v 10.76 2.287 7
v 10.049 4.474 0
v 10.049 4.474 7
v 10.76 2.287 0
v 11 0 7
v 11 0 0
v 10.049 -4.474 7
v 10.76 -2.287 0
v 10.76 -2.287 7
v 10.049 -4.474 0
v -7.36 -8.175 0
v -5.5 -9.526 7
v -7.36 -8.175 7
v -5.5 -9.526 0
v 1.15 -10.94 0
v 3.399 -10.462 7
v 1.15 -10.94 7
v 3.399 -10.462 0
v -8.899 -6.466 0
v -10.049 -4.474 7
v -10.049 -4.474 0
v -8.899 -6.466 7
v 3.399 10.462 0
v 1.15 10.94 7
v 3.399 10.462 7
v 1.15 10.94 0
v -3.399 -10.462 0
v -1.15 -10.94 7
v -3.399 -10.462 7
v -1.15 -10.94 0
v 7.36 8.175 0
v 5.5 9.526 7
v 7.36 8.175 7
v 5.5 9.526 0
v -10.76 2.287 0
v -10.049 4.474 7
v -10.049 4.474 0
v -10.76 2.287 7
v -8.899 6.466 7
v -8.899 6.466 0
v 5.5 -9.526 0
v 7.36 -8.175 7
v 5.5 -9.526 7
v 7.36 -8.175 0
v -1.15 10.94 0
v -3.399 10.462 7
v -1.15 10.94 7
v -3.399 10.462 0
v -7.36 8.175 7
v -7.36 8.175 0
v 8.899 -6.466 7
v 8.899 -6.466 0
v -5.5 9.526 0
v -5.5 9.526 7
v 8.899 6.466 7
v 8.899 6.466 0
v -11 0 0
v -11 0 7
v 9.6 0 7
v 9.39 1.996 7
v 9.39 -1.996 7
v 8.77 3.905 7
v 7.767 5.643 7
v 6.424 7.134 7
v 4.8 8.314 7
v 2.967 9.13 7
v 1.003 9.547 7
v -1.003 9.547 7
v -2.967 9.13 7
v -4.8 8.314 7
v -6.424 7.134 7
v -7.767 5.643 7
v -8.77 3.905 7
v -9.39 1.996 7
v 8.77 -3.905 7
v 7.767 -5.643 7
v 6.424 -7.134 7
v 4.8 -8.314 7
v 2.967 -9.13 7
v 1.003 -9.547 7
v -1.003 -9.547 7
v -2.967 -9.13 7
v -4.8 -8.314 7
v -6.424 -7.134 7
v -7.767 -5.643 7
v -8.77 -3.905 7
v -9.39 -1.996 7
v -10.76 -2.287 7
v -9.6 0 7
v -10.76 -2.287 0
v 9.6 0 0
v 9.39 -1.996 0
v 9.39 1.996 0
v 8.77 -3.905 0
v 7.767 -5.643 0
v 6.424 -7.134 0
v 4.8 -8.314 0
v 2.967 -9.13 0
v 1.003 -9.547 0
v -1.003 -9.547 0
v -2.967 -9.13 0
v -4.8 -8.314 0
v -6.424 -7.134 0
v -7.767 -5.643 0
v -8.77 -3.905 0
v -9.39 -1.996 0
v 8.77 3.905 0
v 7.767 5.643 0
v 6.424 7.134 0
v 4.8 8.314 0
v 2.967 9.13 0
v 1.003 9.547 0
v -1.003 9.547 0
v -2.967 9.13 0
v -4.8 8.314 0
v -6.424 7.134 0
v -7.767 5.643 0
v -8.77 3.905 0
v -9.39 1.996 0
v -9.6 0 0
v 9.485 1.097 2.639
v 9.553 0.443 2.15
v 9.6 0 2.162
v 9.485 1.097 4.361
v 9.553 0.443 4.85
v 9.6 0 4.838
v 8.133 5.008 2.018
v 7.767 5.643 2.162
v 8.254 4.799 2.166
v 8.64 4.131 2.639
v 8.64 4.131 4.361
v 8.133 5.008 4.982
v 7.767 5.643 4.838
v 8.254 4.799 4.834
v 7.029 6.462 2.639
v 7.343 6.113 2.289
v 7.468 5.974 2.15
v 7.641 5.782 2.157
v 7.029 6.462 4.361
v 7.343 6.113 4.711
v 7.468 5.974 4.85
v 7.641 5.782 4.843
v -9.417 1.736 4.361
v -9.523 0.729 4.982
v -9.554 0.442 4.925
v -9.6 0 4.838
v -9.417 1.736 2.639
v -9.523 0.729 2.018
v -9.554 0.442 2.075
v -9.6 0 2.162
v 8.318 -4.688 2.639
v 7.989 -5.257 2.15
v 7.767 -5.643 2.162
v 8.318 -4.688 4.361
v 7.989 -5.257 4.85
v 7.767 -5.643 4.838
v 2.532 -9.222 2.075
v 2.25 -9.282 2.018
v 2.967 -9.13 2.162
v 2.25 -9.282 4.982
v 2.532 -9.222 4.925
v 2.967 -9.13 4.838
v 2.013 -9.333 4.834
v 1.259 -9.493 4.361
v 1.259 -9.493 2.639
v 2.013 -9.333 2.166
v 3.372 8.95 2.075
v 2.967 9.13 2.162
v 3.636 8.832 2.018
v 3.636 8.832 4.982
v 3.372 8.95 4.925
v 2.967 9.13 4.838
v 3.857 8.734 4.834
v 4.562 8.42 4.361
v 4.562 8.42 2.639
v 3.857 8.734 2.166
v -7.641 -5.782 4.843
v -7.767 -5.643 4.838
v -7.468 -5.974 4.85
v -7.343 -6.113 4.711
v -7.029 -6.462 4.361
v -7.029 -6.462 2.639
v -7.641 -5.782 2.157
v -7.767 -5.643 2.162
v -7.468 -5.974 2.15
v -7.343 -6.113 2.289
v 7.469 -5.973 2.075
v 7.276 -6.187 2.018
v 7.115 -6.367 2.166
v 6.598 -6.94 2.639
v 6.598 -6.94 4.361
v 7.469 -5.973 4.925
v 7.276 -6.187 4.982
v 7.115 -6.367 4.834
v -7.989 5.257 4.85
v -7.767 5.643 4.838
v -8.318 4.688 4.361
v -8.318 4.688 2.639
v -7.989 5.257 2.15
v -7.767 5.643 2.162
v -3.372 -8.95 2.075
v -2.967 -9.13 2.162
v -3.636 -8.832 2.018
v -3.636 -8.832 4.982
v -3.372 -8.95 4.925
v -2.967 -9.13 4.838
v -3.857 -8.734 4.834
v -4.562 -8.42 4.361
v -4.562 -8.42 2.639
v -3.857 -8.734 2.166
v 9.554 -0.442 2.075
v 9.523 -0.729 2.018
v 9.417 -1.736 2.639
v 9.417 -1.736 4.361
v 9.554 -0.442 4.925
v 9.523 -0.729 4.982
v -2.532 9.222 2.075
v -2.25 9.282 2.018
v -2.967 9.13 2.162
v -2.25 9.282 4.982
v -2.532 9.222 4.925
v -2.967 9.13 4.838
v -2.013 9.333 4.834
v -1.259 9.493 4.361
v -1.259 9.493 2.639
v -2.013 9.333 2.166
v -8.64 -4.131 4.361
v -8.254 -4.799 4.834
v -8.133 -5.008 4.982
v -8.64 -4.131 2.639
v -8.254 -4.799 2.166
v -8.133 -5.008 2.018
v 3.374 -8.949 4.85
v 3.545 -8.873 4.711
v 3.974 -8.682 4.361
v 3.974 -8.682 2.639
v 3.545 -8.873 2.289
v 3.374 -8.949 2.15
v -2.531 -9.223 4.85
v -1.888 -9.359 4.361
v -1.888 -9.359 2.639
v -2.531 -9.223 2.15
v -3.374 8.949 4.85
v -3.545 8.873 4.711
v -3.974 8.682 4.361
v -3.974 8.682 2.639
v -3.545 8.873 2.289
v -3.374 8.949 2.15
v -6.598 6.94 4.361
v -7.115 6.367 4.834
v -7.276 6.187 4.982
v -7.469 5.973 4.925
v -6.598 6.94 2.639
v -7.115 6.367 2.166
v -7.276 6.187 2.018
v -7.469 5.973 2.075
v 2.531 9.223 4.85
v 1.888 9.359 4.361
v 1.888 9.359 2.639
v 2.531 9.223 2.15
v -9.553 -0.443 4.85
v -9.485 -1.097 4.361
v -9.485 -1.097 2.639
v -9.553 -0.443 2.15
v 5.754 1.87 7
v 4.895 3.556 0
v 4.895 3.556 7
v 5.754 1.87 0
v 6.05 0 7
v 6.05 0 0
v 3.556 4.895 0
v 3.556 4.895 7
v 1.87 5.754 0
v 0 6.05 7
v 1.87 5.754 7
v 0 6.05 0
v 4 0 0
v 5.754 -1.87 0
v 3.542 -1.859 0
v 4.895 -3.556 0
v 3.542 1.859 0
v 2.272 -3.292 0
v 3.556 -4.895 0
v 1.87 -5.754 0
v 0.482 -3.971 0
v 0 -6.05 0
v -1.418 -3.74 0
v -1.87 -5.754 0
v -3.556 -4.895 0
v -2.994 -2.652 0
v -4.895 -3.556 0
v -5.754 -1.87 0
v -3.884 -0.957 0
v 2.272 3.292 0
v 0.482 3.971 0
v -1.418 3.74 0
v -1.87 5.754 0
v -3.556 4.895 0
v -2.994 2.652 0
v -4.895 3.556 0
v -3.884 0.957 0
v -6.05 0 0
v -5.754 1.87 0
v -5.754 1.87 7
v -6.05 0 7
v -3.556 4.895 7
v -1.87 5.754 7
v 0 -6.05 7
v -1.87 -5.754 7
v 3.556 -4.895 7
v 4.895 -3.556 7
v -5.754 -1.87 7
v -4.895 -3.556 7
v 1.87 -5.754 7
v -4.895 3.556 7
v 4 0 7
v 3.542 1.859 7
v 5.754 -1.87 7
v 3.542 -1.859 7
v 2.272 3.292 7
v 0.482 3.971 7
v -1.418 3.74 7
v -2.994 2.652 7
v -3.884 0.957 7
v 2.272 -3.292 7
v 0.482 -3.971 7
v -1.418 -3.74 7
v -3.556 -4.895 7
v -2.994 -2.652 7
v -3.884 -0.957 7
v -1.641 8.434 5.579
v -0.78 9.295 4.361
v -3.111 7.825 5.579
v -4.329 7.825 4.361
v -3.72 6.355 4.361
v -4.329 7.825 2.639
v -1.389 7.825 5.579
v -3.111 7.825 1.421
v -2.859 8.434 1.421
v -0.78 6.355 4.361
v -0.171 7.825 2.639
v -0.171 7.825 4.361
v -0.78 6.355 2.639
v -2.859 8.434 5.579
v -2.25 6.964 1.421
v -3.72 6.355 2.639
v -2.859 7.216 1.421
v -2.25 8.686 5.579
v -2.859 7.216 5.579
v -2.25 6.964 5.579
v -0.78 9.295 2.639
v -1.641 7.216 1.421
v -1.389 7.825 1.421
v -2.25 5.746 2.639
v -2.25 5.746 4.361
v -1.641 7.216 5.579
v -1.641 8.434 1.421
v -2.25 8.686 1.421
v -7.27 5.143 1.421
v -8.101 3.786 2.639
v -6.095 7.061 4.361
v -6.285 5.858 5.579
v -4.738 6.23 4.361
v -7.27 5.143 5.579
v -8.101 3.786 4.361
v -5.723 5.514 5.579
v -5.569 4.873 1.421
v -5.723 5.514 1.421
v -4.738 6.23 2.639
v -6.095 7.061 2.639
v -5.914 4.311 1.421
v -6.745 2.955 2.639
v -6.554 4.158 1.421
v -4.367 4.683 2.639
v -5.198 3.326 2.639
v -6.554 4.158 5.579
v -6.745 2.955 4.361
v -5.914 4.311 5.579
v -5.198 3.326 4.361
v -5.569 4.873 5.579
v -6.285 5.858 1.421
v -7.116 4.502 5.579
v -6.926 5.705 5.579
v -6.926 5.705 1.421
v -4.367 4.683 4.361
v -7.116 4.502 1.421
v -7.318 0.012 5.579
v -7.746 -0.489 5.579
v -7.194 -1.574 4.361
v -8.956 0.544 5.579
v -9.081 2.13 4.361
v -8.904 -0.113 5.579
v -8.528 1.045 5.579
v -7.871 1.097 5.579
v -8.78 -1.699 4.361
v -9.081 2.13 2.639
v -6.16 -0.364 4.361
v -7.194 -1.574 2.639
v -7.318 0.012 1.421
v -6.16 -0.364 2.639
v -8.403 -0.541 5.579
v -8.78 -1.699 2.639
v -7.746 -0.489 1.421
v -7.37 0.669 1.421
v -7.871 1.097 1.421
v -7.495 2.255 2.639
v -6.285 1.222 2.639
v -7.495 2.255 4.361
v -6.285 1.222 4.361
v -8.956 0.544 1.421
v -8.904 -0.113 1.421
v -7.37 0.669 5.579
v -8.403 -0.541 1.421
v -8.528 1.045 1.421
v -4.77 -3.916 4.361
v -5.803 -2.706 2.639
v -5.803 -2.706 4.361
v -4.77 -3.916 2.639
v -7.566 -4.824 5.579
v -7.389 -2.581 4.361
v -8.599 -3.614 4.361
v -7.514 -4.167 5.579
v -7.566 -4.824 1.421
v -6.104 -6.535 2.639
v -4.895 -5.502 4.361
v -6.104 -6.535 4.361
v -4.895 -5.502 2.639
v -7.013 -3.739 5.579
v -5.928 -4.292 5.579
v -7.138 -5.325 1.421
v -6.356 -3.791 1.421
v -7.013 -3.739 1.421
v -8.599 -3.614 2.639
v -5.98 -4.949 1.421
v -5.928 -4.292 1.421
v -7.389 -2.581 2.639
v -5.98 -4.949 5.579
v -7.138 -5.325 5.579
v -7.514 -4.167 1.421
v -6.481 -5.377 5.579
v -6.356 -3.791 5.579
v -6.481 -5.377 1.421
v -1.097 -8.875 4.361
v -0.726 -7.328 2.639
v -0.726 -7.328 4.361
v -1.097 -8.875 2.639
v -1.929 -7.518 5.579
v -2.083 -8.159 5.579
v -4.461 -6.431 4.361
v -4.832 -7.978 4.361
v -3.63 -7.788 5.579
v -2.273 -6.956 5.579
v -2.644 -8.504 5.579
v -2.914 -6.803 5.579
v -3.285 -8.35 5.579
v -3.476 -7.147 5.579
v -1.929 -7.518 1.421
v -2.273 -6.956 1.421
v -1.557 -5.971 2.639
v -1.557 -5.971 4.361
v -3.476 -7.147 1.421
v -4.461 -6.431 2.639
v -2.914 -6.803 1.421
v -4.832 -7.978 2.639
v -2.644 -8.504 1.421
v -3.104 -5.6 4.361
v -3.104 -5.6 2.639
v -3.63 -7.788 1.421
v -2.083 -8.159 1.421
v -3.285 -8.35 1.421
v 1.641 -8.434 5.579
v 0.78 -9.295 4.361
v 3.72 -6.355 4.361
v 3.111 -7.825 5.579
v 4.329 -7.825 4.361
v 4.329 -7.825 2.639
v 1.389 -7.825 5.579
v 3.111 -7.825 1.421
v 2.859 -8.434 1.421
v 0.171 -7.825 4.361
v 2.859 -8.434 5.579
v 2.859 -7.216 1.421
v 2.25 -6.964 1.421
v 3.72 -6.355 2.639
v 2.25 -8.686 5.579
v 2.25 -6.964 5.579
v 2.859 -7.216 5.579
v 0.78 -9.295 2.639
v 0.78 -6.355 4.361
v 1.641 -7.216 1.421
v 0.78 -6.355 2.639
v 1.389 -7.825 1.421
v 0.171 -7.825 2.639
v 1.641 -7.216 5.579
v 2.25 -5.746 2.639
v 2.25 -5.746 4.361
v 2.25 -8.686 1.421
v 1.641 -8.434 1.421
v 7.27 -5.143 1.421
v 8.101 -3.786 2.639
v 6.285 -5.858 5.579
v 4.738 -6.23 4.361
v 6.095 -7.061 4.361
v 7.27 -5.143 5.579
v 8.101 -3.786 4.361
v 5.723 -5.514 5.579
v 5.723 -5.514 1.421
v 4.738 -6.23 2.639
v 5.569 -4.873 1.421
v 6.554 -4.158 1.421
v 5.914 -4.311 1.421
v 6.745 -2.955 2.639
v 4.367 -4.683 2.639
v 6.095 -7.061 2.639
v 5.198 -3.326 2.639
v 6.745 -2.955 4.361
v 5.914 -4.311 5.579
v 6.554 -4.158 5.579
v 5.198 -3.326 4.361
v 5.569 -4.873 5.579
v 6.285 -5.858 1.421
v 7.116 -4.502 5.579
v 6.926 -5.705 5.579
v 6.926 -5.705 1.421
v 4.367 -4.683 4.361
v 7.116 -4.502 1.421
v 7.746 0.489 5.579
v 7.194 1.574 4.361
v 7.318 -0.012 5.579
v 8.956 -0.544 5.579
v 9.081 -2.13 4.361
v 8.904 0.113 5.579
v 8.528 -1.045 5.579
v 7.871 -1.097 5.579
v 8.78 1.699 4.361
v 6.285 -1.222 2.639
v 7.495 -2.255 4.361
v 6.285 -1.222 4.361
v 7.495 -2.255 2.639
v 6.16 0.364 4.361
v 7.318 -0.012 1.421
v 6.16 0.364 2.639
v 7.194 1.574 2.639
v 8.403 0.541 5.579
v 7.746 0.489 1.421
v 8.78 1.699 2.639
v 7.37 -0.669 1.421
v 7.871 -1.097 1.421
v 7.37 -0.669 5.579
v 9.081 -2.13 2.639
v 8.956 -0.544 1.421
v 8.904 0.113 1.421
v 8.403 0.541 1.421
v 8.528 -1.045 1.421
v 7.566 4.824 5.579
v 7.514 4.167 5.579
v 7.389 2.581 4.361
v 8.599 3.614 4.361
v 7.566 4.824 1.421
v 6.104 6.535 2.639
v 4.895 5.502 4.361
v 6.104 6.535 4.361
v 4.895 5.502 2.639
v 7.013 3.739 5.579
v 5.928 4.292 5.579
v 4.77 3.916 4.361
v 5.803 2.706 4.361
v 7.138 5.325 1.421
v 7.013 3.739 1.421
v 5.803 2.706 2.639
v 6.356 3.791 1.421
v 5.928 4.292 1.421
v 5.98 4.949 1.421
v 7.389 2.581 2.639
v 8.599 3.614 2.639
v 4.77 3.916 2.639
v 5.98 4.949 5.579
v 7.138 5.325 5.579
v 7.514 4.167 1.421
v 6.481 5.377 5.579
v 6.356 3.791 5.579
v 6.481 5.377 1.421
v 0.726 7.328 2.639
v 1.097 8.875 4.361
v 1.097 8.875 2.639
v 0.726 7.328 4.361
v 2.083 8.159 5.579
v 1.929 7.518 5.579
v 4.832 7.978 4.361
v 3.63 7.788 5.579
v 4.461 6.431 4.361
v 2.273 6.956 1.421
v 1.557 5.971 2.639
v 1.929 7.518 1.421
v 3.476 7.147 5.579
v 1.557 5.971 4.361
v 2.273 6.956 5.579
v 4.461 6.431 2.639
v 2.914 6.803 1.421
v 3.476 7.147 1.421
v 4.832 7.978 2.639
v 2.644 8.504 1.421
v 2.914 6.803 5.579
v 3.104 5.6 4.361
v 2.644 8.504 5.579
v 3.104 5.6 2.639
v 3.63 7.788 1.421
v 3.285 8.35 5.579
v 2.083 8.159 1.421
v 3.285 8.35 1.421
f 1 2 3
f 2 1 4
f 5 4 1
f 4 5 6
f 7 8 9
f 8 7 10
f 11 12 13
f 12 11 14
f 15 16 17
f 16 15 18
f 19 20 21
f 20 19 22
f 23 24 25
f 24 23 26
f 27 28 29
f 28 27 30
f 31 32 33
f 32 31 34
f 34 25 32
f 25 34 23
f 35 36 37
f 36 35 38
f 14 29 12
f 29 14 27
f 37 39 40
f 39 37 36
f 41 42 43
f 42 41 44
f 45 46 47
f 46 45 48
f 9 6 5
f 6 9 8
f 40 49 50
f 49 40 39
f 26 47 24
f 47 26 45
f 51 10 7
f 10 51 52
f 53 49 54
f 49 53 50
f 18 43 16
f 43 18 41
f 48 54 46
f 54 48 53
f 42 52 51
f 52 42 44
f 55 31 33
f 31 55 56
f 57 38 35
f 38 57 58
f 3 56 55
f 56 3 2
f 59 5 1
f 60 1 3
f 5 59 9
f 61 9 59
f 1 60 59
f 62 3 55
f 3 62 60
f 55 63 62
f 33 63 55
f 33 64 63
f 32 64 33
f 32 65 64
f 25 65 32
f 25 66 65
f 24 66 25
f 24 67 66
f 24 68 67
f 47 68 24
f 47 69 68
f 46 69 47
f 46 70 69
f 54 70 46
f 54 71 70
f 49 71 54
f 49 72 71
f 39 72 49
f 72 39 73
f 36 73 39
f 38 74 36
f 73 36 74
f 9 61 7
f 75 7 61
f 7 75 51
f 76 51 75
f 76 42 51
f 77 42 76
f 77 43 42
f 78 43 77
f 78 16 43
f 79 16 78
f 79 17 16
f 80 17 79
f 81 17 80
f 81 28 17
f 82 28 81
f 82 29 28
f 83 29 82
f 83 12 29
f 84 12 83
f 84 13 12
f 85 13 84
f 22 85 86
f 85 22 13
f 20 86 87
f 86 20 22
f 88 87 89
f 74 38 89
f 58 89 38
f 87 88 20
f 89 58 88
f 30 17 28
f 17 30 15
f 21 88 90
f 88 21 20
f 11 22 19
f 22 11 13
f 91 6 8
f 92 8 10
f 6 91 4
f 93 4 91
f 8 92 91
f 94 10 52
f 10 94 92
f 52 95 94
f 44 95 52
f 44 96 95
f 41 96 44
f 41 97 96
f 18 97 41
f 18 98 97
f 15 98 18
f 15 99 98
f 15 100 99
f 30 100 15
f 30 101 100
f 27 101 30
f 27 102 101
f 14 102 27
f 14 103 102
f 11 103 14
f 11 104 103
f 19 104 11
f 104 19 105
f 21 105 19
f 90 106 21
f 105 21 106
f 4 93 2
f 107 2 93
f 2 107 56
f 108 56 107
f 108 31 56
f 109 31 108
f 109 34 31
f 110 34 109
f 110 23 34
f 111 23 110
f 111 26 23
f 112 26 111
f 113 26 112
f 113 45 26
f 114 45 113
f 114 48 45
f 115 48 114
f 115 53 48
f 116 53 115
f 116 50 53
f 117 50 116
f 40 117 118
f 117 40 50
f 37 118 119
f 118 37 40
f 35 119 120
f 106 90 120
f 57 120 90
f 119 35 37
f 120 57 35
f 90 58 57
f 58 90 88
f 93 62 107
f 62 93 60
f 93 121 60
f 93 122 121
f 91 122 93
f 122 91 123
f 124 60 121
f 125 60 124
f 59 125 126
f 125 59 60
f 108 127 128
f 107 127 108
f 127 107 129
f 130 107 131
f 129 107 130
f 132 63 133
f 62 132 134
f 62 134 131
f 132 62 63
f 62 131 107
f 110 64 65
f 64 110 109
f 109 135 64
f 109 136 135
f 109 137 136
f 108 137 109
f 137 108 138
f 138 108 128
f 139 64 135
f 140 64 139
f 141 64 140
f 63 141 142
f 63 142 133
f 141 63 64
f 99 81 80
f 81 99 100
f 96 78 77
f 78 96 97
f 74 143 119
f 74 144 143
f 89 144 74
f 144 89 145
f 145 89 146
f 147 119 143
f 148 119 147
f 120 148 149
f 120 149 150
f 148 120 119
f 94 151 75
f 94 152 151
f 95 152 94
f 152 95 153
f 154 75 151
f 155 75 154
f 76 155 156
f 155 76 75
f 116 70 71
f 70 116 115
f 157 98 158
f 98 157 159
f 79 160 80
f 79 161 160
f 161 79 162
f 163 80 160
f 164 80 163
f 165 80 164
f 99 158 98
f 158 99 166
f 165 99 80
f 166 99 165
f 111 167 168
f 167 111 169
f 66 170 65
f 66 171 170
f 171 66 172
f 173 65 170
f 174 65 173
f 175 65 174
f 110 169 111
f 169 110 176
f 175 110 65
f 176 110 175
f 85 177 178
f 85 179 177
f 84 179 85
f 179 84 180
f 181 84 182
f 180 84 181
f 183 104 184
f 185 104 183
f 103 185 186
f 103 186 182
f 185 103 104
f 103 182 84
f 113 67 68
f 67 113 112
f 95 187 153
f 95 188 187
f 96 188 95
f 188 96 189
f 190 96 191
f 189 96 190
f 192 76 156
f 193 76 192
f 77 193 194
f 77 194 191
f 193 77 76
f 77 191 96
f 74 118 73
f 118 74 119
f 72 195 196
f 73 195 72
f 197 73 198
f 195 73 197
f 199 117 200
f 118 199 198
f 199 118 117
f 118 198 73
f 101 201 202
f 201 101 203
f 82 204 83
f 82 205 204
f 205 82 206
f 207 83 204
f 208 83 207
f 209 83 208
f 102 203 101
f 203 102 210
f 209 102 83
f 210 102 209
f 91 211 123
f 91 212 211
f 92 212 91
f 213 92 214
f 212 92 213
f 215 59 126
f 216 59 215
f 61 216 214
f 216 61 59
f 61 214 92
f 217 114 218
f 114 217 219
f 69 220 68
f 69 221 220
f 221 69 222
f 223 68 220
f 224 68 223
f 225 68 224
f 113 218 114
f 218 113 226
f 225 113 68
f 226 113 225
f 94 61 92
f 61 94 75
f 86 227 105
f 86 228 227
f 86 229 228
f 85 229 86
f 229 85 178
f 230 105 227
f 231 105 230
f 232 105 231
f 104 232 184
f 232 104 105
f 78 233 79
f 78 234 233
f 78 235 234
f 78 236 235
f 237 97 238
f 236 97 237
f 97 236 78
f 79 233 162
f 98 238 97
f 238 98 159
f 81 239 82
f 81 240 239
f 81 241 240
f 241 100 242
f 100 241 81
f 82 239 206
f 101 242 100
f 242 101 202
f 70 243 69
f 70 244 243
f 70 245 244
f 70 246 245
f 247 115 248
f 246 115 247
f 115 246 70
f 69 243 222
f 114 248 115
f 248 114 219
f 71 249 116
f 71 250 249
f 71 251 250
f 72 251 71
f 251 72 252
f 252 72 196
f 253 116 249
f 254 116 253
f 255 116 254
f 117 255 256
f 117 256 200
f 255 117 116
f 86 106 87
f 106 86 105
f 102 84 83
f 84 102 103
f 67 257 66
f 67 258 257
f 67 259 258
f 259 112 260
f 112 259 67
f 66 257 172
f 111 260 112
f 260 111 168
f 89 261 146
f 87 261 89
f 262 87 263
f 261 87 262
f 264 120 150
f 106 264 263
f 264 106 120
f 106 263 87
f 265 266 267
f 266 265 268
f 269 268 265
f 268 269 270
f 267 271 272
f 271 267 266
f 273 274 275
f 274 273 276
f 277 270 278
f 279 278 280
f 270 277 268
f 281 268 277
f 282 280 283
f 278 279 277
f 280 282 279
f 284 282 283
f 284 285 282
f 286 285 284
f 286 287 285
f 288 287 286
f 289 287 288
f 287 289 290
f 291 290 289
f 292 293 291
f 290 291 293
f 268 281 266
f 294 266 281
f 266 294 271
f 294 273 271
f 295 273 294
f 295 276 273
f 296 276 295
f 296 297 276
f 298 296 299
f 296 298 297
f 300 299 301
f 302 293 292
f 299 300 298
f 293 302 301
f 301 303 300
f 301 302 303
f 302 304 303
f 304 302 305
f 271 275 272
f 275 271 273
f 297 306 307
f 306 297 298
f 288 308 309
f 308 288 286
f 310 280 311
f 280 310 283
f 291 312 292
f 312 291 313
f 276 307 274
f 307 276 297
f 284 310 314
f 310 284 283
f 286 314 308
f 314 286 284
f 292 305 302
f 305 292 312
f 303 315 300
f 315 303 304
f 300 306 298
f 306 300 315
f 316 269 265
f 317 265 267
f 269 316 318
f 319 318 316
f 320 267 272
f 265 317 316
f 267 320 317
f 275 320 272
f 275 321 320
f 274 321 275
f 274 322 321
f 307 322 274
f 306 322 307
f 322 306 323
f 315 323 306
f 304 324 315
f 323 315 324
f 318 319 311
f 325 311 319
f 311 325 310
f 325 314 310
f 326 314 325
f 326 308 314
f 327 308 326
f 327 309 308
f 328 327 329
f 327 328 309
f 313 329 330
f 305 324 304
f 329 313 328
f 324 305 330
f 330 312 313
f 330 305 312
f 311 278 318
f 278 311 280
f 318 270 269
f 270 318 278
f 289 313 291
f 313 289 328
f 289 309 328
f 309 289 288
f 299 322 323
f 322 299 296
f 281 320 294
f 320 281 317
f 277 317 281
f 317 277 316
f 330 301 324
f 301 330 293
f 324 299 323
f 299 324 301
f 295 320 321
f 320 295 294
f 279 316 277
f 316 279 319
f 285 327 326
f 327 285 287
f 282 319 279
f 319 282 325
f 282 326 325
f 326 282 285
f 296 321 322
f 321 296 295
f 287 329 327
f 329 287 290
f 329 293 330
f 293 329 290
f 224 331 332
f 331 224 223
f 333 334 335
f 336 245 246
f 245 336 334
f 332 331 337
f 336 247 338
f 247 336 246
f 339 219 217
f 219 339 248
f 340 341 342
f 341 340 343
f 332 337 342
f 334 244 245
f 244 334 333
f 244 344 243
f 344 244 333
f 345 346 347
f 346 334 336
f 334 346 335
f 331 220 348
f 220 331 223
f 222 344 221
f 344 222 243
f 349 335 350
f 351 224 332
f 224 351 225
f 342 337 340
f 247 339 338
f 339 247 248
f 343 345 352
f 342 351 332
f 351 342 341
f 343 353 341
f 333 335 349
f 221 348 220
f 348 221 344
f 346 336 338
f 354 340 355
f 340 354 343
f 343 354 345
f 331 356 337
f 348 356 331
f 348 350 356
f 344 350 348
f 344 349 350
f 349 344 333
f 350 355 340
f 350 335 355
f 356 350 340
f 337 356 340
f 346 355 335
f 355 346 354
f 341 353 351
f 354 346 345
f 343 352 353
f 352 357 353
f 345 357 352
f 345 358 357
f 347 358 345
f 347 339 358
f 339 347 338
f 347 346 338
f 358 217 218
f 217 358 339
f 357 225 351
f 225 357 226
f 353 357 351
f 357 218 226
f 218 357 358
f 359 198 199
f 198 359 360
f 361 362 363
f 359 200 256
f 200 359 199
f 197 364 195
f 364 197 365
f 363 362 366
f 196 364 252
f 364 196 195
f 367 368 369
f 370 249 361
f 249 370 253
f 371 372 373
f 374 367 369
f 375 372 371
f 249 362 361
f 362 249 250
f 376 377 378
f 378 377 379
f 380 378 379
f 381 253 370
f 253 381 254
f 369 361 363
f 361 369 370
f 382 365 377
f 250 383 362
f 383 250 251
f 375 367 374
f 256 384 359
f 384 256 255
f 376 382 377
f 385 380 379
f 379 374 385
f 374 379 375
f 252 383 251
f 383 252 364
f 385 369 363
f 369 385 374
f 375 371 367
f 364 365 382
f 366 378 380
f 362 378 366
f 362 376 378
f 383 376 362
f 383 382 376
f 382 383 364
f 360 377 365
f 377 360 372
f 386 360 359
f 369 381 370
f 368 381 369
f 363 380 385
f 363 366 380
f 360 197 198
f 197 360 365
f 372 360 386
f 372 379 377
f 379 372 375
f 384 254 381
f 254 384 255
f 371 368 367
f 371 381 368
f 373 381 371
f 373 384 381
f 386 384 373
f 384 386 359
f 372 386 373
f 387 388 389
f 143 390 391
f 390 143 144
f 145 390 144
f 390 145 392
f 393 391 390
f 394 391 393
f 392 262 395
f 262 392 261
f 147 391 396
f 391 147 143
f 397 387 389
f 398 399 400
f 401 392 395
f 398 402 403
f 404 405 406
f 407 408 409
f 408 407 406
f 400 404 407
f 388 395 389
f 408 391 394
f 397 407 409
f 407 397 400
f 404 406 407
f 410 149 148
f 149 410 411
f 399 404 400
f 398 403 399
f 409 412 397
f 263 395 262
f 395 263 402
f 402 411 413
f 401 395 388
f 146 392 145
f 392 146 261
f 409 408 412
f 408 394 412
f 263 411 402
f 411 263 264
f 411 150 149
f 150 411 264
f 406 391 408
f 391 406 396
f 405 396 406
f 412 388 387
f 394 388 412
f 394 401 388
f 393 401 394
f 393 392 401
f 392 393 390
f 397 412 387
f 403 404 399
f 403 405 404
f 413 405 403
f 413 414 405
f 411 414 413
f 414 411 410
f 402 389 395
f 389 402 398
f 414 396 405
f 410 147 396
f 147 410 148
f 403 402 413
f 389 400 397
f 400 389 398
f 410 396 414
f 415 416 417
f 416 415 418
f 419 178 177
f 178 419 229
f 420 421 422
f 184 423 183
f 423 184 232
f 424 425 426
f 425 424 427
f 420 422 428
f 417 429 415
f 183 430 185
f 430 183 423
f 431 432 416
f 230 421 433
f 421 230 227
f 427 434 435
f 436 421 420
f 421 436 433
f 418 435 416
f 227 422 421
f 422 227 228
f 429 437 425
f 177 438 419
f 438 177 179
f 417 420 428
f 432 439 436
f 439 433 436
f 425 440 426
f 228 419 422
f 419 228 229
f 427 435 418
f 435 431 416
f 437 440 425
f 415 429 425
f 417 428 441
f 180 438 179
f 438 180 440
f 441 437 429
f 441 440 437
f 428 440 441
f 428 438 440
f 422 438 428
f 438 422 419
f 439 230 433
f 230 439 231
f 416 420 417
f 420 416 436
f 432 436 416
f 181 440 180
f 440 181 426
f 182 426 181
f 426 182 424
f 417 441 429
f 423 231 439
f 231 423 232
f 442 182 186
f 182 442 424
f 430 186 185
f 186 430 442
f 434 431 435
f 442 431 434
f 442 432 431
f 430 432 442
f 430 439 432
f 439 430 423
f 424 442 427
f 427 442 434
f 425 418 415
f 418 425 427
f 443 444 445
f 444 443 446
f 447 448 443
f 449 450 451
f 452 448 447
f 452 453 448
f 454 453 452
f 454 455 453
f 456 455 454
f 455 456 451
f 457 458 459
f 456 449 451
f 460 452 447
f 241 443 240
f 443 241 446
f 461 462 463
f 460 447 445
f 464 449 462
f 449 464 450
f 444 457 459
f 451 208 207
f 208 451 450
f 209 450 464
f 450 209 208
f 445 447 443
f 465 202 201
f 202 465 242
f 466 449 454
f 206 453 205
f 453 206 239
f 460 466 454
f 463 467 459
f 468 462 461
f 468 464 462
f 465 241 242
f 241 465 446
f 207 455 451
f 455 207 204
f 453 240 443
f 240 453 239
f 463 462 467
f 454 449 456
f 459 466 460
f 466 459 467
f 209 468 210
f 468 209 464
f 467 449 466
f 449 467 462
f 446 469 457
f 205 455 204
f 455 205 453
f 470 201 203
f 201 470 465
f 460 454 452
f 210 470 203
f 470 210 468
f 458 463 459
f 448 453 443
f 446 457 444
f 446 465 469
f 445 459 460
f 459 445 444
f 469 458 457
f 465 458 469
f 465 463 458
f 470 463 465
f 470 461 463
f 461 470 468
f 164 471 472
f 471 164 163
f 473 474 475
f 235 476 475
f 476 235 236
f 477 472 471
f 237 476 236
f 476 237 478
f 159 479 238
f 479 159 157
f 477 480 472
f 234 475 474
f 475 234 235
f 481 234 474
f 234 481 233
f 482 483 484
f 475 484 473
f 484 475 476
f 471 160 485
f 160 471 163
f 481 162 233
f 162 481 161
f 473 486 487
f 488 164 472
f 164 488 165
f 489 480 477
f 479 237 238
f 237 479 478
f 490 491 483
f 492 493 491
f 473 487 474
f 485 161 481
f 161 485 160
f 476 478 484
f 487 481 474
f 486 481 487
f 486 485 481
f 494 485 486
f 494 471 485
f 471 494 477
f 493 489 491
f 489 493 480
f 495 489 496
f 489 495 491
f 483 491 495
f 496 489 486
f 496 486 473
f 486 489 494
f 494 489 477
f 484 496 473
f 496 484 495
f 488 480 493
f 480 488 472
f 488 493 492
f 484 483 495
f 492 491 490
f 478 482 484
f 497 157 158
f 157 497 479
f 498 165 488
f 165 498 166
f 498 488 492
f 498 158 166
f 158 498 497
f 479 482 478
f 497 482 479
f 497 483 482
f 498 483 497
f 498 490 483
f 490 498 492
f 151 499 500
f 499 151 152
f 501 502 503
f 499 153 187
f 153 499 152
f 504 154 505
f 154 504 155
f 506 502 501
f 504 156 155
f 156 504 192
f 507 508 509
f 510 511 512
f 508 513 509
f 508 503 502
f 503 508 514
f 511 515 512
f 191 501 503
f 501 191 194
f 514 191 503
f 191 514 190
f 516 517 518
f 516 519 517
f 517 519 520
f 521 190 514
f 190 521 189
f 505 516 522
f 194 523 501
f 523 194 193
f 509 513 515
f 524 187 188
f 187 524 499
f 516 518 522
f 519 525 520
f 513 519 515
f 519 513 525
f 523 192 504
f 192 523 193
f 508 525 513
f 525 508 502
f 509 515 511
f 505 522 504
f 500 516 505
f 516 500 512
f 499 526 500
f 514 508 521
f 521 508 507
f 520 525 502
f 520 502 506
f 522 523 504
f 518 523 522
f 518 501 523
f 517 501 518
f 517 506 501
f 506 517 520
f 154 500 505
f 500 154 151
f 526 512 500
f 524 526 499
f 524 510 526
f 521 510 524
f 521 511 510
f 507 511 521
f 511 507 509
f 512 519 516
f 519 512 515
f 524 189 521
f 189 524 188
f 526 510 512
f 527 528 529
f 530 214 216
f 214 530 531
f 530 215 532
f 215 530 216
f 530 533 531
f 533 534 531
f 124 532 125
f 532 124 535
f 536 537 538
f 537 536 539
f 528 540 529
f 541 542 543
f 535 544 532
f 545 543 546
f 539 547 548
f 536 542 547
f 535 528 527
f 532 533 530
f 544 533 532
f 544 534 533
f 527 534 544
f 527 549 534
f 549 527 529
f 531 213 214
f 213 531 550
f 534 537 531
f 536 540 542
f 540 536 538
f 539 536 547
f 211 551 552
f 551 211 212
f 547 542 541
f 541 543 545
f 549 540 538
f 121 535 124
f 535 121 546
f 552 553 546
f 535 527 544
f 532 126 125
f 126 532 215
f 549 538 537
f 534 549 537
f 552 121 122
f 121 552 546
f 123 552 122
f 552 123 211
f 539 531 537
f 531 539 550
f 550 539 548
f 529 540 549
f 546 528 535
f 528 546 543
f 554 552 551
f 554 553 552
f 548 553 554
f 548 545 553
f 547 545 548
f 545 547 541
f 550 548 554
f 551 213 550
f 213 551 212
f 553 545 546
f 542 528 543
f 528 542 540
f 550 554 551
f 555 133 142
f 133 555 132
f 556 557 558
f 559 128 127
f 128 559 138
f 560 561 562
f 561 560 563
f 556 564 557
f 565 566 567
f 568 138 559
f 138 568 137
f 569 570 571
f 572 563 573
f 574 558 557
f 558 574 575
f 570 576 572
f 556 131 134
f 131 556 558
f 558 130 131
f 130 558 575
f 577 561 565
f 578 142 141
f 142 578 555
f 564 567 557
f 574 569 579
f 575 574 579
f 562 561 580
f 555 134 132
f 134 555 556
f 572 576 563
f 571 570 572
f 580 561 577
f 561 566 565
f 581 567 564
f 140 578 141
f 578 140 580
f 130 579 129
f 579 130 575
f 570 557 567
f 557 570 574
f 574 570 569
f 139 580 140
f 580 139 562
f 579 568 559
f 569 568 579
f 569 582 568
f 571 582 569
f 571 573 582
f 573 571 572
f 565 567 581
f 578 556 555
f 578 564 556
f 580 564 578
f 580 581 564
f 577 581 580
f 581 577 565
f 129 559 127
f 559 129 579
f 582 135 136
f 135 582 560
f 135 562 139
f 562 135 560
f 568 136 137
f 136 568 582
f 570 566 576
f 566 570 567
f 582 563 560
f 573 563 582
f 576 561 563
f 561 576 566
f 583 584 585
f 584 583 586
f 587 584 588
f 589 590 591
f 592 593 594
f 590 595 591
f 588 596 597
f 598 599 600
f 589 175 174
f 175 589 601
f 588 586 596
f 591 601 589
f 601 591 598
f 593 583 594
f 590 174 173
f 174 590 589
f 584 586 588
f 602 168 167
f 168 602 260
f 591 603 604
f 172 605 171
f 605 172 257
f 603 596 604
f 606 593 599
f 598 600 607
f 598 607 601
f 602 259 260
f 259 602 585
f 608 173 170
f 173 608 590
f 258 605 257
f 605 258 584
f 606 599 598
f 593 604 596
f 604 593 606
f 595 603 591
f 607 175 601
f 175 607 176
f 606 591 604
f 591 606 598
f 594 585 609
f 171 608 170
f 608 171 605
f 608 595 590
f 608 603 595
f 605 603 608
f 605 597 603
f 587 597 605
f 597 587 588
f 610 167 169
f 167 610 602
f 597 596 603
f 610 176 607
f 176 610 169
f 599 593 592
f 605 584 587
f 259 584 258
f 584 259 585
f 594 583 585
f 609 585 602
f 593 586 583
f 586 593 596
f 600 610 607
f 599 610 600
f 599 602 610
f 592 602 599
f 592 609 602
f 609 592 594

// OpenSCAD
outerRingOuterDiameter = 22;
outerRingInnerDiameter = 19.2;

innerRingOuterDiameter = 12.1;
innerRingInnerDiameter = 8;

bearingBallCount = 10;
bearingBallGrooveDepth = 0.1;
bearingBallDiameter = 4.5;

bearingWidth = 7;

module zFight(factor = 1) {
  // Using a zFight fix for previews
  zFightFix=0.005;
  zFightFix2x=zFightFix * 2;
  translate([0, 0, -0.5 * factor * zFightFix]) scale([1,1,1+(zFightFix * factor)]) children();
}


module outerRing() {
  difference() {
    cylinder(r=outerRingOuterDiameter/2, h=bearingWidth);
    zFight() cylinder(r=outerRingInnerDiameter/2, h=bearingWidth);
  }
}

module innerRing() {
  difference() {
    cylinder(r=innerRingOuterDiameter/2, h=bearingWidth);
    zFight() cylinder(r=innerRingInnerDiameter/2, h=bearingWidth);
  }
}

module bearingBalls() {
  $fn = $fn / 4;

  angle = 360 / bearingBallCount;
  distanceToCenter = (innerRingOuterDiameter+outerRingInnerDiameter)/2/2;

  for(i=[0:1:bearingBallCount]) {
    rotate([0, 0, i*angle]) translate([-bearingBallDiameter/2, distanceToCenter, bearingWidth/2]) sphere(r=bearingBallDiameter/2, center=true);
  }
}

module bearing() {
  union() {
    outerRing();
    innerRing();
    bearingBalls();
  }
}

bearing();
